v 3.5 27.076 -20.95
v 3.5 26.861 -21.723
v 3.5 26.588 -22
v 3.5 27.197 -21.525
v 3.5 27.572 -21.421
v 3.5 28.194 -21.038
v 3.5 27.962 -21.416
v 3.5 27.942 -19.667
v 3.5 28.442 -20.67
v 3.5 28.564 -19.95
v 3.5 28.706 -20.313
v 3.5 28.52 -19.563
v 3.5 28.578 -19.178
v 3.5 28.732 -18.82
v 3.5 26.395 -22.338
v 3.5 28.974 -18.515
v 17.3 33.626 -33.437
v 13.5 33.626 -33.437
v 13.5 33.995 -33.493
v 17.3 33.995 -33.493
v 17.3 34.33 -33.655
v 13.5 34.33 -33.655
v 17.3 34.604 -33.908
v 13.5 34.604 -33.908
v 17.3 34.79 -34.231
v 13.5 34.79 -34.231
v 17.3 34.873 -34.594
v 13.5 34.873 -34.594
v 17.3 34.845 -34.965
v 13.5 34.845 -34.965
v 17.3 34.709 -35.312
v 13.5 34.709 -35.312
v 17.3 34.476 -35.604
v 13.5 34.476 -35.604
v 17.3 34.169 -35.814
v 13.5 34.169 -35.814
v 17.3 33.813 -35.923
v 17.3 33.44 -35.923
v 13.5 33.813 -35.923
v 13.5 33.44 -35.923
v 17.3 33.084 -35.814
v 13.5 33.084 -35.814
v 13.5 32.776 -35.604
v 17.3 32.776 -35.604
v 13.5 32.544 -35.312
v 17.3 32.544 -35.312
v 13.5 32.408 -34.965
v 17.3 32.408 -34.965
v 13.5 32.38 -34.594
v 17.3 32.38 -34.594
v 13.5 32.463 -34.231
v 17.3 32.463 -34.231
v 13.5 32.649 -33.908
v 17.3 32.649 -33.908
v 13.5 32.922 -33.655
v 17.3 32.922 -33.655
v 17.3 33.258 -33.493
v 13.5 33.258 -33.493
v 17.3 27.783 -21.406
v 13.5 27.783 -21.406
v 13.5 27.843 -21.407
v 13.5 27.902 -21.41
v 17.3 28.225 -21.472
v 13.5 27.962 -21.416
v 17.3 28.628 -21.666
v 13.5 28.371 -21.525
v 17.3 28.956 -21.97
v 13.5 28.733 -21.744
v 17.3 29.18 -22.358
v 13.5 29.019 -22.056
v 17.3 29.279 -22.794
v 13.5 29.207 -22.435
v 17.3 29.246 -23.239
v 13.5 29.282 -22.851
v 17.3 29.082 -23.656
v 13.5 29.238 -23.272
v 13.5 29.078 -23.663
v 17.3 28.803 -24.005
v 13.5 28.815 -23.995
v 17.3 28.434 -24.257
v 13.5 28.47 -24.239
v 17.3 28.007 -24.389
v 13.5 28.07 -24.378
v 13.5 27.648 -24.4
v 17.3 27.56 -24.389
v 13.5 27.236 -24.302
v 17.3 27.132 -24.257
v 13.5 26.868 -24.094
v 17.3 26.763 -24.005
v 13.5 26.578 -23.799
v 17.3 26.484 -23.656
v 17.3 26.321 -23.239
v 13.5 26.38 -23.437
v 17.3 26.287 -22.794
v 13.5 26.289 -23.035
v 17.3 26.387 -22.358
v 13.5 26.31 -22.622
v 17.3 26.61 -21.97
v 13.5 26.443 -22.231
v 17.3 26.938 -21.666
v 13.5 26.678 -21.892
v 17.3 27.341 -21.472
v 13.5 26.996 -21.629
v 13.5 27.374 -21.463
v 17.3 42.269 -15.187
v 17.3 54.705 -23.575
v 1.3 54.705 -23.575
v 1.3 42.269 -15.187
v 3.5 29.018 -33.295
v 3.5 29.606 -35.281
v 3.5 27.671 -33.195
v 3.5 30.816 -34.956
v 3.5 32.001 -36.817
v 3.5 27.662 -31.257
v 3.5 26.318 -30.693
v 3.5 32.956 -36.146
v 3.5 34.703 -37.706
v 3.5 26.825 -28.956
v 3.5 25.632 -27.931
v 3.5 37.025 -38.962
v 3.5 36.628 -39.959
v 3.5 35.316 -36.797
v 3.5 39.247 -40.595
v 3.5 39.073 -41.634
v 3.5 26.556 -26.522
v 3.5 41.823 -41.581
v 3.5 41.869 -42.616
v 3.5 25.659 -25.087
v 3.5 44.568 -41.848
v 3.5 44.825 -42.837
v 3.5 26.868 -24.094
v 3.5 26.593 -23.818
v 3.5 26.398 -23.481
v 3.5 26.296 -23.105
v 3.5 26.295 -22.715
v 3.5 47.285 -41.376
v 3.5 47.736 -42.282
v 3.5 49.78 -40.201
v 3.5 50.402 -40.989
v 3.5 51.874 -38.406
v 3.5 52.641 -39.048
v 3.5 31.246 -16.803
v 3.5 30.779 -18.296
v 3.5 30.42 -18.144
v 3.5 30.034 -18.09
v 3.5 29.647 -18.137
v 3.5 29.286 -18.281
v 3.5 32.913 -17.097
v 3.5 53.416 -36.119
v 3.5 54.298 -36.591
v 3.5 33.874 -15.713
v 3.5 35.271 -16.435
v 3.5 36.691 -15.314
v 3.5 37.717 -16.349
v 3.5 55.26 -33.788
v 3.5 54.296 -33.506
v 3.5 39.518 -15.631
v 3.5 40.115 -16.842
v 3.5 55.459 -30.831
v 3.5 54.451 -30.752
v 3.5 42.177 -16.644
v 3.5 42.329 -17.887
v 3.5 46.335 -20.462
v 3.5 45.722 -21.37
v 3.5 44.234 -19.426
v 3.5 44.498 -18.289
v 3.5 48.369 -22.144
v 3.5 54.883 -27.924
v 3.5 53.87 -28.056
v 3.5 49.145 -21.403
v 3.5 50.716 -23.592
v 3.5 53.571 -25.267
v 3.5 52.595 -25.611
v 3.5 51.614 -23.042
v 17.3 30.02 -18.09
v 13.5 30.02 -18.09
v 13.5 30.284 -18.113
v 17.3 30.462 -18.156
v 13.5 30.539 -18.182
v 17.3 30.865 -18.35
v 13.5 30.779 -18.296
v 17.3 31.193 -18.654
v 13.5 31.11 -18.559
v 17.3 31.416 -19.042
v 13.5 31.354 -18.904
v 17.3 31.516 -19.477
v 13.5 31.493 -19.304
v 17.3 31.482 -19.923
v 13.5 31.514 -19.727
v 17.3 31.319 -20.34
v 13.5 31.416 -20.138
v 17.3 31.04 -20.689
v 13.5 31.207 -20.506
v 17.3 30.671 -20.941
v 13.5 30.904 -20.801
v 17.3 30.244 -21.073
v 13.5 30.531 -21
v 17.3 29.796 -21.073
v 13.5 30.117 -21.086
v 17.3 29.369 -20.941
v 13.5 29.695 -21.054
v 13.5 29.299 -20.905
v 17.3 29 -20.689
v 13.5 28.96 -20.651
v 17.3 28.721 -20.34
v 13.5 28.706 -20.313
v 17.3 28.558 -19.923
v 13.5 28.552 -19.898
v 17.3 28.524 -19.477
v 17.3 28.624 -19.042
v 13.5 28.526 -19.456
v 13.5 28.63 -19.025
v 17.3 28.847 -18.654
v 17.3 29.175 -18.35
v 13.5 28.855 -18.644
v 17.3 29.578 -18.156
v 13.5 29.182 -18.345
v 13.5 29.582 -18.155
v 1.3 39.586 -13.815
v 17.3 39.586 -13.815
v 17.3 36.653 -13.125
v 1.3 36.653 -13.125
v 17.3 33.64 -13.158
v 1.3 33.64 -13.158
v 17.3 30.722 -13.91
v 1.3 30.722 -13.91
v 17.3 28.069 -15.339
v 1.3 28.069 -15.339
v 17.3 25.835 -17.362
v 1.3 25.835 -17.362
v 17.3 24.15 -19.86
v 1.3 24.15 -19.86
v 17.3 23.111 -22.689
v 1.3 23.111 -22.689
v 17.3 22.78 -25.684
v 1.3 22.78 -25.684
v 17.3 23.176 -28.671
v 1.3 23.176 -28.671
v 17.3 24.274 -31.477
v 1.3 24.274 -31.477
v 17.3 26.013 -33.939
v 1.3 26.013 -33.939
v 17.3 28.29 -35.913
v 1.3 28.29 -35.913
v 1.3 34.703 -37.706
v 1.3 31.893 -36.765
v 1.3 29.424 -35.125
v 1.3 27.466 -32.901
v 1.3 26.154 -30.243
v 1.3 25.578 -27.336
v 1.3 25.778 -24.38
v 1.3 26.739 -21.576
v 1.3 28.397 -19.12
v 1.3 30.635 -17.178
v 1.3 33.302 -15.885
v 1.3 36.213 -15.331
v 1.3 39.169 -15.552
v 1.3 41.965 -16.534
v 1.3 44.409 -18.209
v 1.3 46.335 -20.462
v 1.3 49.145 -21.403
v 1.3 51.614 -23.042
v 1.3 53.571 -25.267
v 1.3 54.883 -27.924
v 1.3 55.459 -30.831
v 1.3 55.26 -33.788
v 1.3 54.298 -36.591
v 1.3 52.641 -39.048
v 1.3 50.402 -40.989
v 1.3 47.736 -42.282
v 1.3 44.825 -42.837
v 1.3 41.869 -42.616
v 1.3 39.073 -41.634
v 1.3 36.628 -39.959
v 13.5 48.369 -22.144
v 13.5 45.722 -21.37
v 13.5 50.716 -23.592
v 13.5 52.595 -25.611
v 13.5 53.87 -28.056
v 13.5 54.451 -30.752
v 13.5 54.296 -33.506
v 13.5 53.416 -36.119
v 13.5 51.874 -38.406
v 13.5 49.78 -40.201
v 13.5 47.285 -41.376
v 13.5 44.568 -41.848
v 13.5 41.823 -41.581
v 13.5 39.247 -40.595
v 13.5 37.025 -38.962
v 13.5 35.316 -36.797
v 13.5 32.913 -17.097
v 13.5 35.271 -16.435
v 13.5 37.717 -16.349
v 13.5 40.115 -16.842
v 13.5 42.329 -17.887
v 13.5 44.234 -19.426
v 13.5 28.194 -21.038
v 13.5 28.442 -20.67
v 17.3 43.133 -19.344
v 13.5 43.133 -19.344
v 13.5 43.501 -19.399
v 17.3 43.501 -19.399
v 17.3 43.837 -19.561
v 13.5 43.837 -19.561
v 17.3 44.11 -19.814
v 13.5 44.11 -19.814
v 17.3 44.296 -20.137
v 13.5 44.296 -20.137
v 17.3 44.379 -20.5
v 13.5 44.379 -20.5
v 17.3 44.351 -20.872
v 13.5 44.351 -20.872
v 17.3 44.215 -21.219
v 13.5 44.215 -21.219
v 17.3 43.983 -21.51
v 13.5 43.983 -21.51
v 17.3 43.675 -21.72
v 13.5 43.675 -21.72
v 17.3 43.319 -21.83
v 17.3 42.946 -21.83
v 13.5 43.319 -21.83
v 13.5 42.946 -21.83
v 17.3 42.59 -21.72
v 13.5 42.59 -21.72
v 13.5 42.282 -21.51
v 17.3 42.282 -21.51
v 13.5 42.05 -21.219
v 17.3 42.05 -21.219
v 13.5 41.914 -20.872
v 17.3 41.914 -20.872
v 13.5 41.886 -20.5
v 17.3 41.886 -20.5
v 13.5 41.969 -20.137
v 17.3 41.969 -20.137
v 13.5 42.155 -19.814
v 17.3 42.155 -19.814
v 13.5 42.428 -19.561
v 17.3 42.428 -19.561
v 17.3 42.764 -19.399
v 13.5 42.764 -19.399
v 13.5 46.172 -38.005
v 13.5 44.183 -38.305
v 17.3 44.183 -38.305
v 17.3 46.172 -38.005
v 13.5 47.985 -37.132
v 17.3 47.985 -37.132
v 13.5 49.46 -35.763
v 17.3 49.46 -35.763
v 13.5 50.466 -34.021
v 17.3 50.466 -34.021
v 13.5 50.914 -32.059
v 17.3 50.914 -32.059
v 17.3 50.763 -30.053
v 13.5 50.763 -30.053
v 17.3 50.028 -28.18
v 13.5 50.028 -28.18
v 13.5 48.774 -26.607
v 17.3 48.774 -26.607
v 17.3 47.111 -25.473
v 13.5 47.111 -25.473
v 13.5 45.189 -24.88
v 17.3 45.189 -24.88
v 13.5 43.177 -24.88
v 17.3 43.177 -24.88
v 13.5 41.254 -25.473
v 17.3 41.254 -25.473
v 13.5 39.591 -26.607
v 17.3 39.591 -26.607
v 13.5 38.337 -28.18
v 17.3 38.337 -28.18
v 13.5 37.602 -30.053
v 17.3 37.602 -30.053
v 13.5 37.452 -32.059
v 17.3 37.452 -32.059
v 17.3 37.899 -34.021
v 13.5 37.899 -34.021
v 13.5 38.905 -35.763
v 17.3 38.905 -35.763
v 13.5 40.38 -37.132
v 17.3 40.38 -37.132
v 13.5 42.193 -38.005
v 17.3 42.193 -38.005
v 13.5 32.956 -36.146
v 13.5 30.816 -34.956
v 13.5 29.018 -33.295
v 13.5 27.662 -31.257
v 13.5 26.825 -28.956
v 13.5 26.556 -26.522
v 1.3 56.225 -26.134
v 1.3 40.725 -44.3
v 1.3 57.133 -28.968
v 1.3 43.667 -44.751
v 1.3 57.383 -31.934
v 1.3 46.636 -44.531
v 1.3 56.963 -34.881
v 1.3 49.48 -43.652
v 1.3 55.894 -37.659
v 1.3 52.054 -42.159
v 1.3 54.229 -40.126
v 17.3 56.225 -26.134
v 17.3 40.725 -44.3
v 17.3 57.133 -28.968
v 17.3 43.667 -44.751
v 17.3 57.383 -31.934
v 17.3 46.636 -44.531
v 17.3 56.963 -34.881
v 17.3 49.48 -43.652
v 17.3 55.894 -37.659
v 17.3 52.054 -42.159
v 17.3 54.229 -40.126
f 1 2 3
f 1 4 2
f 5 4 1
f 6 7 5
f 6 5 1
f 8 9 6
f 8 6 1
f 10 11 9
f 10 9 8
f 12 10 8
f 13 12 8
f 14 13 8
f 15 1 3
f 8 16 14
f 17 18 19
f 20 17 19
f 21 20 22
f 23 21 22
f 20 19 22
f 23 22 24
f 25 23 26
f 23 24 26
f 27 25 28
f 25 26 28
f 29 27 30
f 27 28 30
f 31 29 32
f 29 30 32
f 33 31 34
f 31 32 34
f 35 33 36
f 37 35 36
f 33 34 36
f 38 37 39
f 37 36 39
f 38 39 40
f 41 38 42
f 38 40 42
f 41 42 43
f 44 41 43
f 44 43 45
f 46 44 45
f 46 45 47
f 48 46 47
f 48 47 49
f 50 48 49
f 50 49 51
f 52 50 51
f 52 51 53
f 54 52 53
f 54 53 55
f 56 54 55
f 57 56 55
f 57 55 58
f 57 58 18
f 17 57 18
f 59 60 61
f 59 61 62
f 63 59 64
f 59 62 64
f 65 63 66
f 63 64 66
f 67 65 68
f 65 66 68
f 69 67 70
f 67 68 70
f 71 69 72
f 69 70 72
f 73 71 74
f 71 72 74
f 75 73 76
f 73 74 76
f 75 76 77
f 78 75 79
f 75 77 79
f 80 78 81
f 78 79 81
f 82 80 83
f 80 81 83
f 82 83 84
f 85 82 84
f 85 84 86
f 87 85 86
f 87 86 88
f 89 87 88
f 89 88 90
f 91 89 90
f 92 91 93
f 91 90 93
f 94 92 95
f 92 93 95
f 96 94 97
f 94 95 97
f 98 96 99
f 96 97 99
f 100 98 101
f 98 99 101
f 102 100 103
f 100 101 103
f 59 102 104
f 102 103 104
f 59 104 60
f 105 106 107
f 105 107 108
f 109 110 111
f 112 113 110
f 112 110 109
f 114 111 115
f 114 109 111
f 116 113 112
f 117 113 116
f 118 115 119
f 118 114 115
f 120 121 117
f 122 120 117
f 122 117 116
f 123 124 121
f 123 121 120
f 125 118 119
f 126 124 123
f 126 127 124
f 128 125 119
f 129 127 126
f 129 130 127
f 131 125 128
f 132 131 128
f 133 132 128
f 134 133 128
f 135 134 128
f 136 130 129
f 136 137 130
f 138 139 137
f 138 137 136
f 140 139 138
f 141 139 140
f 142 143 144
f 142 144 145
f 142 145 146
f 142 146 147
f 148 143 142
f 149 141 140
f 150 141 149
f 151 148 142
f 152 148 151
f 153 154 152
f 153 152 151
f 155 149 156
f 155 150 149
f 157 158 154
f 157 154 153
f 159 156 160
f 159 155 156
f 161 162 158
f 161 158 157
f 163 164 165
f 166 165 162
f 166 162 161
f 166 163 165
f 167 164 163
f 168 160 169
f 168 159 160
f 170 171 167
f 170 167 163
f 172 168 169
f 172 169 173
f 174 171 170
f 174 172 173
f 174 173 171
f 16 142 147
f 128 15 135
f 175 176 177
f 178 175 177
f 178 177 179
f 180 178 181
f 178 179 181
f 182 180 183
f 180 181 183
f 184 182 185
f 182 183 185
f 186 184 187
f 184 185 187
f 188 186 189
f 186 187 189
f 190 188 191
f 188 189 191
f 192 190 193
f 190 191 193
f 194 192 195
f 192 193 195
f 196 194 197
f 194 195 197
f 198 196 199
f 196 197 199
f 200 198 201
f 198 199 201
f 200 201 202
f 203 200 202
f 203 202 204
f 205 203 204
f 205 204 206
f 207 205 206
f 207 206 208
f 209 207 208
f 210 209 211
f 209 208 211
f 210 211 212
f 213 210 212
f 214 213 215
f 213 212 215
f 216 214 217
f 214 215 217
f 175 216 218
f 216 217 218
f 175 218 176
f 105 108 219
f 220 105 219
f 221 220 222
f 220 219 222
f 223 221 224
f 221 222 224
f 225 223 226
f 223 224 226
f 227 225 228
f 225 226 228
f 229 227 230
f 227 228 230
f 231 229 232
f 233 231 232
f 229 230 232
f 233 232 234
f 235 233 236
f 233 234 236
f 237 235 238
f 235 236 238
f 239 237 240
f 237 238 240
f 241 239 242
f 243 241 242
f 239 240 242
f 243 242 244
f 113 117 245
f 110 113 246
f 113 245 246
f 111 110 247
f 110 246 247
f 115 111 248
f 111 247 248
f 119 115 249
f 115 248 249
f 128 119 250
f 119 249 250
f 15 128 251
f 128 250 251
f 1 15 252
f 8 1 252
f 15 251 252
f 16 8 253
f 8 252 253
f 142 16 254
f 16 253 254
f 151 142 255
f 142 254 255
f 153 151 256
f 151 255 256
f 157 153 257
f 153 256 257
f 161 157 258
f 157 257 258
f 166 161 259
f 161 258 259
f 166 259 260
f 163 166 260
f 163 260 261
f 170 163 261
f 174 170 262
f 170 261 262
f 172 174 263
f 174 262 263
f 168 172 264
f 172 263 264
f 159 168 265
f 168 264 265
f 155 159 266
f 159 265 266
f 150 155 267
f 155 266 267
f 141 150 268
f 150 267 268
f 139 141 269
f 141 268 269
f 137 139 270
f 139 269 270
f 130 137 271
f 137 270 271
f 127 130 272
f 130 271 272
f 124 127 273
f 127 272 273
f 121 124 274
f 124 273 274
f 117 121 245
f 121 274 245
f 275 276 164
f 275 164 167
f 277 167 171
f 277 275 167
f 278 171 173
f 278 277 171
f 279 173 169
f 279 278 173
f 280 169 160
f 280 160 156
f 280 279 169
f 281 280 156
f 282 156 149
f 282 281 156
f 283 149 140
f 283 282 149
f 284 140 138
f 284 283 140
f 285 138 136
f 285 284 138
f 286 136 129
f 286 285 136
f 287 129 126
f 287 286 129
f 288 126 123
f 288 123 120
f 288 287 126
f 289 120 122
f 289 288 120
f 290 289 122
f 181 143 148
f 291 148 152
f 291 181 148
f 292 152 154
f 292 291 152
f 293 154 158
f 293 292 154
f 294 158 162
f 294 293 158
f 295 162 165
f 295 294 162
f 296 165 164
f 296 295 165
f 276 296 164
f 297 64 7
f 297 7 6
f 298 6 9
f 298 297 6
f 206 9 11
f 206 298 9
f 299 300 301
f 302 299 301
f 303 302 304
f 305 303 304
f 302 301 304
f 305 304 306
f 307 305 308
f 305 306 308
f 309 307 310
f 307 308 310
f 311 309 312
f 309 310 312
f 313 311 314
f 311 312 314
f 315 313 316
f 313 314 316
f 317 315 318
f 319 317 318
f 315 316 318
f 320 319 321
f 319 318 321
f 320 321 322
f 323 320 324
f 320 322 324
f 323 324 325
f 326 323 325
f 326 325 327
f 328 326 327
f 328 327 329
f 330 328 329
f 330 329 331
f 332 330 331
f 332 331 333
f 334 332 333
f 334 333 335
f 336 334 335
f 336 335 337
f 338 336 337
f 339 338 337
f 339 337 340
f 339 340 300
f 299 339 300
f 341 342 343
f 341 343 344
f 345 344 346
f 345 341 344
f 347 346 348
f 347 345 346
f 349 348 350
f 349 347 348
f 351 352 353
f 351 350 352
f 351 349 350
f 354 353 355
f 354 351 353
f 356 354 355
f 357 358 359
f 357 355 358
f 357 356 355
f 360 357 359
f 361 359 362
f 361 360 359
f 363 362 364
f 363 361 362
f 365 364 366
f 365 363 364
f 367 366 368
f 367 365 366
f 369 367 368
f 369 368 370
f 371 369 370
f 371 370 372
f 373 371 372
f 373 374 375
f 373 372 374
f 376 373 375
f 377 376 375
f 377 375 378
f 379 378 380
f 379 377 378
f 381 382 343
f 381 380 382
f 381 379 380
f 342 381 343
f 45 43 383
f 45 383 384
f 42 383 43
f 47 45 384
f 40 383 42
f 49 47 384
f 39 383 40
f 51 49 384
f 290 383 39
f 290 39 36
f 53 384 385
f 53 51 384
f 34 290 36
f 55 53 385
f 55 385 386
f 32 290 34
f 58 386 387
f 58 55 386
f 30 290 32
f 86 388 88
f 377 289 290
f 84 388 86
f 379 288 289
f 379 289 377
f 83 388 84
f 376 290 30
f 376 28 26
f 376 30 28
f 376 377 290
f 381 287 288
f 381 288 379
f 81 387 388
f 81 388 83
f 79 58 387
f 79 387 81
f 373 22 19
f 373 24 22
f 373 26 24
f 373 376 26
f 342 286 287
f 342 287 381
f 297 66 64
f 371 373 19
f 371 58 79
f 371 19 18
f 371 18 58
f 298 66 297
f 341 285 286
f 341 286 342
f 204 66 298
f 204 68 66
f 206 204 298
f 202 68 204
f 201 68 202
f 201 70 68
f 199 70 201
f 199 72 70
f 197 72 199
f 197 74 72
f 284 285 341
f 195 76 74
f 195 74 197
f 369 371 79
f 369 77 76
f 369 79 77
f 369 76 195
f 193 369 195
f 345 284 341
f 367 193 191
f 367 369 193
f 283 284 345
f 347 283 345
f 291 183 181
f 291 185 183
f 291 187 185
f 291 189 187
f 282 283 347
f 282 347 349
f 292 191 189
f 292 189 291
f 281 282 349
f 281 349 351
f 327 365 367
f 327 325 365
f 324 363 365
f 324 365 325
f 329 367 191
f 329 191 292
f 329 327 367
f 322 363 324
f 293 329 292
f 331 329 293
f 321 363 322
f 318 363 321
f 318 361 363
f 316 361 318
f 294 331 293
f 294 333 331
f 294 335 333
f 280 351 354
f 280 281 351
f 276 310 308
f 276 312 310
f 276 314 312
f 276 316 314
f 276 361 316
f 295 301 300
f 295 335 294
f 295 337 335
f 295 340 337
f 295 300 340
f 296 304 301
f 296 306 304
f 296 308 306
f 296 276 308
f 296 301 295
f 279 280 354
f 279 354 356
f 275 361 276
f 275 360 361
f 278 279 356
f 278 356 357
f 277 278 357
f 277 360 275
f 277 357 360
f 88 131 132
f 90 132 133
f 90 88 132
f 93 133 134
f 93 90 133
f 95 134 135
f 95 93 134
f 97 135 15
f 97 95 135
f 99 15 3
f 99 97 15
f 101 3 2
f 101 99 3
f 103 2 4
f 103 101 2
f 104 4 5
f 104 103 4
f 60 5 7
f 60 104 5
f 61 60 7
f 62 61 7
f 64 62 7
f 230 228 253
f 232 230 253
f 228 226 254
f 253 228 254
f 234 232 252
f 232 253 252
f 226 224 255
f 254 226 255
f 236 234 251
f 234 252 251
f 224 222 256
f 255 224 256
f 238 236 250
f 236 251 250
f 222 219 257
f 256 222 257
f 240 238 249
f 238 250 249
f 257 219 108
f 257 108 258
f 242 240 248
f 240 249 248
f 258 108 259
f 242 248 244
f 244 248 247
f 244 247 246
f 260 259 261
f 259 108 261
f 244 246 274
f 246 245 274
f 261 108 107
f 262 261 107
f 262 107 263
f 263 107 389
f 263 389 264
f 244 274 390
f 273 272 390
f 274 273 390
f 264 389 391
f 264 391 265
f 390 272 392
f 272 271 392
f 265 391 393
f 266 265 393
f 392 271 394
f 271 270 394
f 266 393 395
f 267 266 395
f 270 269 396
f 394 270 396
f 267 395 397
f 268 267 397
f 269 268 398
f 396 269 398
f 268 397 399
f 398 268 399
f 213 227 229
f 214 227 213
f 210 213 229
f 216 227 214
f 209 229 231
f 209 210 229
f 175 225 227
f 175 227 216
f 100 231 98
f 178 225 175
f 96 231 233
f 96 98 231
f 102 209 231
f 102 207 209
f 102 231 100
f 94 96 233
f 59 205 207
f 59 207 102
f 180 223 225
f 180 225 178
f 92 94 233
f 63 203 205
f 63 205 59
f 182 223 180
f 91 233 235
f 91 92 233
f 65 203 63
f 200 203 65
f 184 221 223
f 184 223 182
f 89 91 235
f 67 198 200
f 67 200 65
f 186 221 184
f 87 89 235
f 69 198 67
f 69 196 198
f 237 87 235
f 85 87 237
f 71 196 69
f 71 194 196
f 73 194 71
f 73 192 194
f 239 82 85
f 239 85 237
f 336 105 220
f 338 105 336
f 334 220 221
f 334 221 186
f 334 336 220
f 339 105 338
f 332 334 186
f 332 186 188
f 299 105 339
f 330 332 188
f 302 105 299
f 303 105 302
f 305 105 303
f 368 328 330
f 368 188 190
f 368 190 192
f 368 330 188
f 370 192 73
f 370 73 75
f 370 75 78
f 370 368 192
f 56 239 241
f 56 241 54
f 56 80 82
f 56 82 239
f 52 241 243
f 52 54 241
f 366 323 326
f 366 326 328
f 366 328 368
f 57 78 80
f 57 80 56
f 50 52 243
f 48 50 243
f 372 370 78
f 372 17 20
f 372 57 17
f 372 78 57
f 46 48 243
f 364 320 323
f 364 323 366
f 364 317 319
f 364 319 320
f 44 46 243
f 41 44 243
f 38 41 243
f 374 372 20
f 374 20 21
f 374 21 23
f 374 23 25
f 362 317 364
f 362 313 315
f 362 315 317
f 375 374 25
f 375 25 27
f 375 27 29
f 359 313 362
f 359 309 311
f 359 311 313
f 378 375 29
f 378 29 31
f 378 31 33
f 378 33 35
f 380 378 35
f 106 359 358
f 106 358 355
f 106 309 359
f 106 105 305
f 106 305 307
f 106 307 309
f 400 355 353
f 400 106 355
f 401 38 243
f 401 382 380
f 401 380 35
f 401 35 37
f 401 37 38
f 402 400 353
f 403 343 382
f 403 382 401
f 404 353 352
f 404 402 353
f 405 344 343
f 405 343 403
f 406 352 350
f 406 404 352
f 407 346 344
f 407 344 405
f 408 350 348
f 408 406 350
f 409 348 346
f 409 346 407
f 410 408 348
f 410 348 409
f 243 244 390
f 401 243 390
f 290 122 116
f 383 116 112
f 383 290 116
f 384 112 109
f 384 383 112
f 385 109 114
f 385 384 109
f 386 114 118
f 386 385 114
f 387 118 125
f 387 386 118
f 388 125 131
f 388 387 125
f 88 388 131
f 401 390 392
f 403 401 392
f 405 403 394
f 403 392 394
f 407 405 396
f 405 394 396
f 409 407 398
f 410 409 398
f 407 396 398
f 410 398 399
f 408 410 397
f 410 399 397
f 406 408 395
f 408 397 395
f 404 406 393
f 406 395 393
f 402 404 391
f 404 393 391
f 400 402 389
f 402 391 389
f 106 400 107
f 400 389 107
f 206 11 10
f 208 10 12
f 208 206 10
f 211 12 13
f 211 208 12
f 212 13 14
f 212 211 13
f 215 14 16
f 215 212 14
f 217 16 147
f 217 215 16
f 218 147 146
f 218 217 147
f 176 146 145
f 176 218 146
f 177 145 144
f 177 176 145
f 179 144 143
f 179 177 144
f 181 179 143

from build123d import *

# Parameters (mm, degrees)
EXTRUDE_START            = 1.3
EXTRUDE_1_DEPTH          = 16
CUT_EXTRUDE_1_DEPTH      = 13.5
SKETCH_1_4_R             = 6.75
CUT_EXTRUDE_2_DEPTH      = 18.3
EXTRUDE_2_DEPTH          = 10
SKETCH_3_R               = 1.25
SKETCH_3_R_2             = 1.5
CUT_EXTRUDE_4_DEPTH      = 13.2
CUT_EXTRUDE_4_DEPTH_BACK = 4.8


with BuildPart() as part:
    # 草图1 → 凸台-拉伸1 (new body)
    with BuildSketch(Plane(origin=(0, 0, 0), x_dir=(0, 0, -1), z_dir=(1, 0, 0)).offset(EXTRUDE_START)):
        with BuildLine():
            Line((23.574545879, 54.705015226), (15.186652327, 42.269451638))
            ThreePointArc((15.186652327, 42.269451638), (18.559710691, 24.916570688), (35.912591641, 28.289629051))
            Line((35.912591641, 28.289629051), (44.300485193, 40.72519264))
            ThreePointArc((44.300485193, 40.72519264), (38.939692203, 55.131135816), (23.574545879, 54.705015226))
        make_face()
    extrude(amount=EXTRUDE_1_DEPTH)

    # 草图1<3> → 切除-拉伸1 (cut)
    with BuildSketch(Plane(origin=(0, 0, 0), x_dir=(0, 0, -1), z_dir=(1, 0, 0))):
        with BuildLine():
            ThreePointArc((20.461625434, 46.334508412), (37.873723753, 53.550772599), (37.705606944, 34.70329602))
            ThreePointArc((37.705606944, 34.70329602), (20.293508625, 27.487031833), (20.461625434, 46.334508412))
        make_face()
    extrude(amount=CUT_EXTRUDE_1_DEPTH, mode=Mode.SUBTRACT)

    # 草图1<4> → 切除-拉伸2 (cut, through all)
    with BuildSketch(Plane(origin=(0, 0, 0), x_dir=(0, 0, -1), z_dir=(1, 0, 0))):
        with Locations((31.554843944, 44.182648029)):
            Circle(SKETCH_1_4_R)
    extrude(amount=CUT_EXTRUDE_2_DEPTH, mode=Mode.SUBTRACT)

    # 草图2 → 凸台-拉伸2 (add)
    with BuildSketch(Plane.ZY.offset(-13.5)):
        with BuildLine():
            ThreePointArc((-20.461625434, 46.334508412), (-37.873723753, 53.550772599), (-37.705606944, 34.70329602))
            ThreePointArc((-37.705606944, 34.70329602), (-20.293508625, 27.487031833), (-20.461625434, 46.334508412))
        make_face()
        with BuildLine():
            ThreePointArc((-36.796785017, 35.31630415), (-20.852701529, 28.316069405), (-21.370447361, 45.721500282))
            ThreePointArc((-21.370447361, 45.721500282), (-37.314530849, 52.721735026), (-36.796785017, 35.31630415))
        make_face(mode=Mode.SUBTRACT)
    extrude(amount=EXTRUDE_2_DEPTH)

    # 草图3 → 切除-拉伸4 (cut, two sides)
    with BuildSketch(Plane.ZY.offset(-13.5)) as cut_extrude_4_sk:
        with Locations((-34.687312986, 33.626245342)):
            Circle(SKETCH_3_R)
        with Locations((-20.593674253, 43.132524701)):
            Circle(SKETCH_3_R)
        with Locations((-22.9057078, 27.783193072)):
            Circle(SKETCH_3_R_2)
        with Locations((-19.58955751, 30.019964685)):
            Circle(SKETCH_3_R_2)
    extrude(amount=CUT_EXTRUDE_4_DEPTH, mode=Mode.SUBTRACT)
    extrude(cut_extrude_4_sk.sketch, amount=-CUT_EXTRUDE_4_DEPTH_BACK, mode=Mode.SUBTRACT)


solid = part.part
